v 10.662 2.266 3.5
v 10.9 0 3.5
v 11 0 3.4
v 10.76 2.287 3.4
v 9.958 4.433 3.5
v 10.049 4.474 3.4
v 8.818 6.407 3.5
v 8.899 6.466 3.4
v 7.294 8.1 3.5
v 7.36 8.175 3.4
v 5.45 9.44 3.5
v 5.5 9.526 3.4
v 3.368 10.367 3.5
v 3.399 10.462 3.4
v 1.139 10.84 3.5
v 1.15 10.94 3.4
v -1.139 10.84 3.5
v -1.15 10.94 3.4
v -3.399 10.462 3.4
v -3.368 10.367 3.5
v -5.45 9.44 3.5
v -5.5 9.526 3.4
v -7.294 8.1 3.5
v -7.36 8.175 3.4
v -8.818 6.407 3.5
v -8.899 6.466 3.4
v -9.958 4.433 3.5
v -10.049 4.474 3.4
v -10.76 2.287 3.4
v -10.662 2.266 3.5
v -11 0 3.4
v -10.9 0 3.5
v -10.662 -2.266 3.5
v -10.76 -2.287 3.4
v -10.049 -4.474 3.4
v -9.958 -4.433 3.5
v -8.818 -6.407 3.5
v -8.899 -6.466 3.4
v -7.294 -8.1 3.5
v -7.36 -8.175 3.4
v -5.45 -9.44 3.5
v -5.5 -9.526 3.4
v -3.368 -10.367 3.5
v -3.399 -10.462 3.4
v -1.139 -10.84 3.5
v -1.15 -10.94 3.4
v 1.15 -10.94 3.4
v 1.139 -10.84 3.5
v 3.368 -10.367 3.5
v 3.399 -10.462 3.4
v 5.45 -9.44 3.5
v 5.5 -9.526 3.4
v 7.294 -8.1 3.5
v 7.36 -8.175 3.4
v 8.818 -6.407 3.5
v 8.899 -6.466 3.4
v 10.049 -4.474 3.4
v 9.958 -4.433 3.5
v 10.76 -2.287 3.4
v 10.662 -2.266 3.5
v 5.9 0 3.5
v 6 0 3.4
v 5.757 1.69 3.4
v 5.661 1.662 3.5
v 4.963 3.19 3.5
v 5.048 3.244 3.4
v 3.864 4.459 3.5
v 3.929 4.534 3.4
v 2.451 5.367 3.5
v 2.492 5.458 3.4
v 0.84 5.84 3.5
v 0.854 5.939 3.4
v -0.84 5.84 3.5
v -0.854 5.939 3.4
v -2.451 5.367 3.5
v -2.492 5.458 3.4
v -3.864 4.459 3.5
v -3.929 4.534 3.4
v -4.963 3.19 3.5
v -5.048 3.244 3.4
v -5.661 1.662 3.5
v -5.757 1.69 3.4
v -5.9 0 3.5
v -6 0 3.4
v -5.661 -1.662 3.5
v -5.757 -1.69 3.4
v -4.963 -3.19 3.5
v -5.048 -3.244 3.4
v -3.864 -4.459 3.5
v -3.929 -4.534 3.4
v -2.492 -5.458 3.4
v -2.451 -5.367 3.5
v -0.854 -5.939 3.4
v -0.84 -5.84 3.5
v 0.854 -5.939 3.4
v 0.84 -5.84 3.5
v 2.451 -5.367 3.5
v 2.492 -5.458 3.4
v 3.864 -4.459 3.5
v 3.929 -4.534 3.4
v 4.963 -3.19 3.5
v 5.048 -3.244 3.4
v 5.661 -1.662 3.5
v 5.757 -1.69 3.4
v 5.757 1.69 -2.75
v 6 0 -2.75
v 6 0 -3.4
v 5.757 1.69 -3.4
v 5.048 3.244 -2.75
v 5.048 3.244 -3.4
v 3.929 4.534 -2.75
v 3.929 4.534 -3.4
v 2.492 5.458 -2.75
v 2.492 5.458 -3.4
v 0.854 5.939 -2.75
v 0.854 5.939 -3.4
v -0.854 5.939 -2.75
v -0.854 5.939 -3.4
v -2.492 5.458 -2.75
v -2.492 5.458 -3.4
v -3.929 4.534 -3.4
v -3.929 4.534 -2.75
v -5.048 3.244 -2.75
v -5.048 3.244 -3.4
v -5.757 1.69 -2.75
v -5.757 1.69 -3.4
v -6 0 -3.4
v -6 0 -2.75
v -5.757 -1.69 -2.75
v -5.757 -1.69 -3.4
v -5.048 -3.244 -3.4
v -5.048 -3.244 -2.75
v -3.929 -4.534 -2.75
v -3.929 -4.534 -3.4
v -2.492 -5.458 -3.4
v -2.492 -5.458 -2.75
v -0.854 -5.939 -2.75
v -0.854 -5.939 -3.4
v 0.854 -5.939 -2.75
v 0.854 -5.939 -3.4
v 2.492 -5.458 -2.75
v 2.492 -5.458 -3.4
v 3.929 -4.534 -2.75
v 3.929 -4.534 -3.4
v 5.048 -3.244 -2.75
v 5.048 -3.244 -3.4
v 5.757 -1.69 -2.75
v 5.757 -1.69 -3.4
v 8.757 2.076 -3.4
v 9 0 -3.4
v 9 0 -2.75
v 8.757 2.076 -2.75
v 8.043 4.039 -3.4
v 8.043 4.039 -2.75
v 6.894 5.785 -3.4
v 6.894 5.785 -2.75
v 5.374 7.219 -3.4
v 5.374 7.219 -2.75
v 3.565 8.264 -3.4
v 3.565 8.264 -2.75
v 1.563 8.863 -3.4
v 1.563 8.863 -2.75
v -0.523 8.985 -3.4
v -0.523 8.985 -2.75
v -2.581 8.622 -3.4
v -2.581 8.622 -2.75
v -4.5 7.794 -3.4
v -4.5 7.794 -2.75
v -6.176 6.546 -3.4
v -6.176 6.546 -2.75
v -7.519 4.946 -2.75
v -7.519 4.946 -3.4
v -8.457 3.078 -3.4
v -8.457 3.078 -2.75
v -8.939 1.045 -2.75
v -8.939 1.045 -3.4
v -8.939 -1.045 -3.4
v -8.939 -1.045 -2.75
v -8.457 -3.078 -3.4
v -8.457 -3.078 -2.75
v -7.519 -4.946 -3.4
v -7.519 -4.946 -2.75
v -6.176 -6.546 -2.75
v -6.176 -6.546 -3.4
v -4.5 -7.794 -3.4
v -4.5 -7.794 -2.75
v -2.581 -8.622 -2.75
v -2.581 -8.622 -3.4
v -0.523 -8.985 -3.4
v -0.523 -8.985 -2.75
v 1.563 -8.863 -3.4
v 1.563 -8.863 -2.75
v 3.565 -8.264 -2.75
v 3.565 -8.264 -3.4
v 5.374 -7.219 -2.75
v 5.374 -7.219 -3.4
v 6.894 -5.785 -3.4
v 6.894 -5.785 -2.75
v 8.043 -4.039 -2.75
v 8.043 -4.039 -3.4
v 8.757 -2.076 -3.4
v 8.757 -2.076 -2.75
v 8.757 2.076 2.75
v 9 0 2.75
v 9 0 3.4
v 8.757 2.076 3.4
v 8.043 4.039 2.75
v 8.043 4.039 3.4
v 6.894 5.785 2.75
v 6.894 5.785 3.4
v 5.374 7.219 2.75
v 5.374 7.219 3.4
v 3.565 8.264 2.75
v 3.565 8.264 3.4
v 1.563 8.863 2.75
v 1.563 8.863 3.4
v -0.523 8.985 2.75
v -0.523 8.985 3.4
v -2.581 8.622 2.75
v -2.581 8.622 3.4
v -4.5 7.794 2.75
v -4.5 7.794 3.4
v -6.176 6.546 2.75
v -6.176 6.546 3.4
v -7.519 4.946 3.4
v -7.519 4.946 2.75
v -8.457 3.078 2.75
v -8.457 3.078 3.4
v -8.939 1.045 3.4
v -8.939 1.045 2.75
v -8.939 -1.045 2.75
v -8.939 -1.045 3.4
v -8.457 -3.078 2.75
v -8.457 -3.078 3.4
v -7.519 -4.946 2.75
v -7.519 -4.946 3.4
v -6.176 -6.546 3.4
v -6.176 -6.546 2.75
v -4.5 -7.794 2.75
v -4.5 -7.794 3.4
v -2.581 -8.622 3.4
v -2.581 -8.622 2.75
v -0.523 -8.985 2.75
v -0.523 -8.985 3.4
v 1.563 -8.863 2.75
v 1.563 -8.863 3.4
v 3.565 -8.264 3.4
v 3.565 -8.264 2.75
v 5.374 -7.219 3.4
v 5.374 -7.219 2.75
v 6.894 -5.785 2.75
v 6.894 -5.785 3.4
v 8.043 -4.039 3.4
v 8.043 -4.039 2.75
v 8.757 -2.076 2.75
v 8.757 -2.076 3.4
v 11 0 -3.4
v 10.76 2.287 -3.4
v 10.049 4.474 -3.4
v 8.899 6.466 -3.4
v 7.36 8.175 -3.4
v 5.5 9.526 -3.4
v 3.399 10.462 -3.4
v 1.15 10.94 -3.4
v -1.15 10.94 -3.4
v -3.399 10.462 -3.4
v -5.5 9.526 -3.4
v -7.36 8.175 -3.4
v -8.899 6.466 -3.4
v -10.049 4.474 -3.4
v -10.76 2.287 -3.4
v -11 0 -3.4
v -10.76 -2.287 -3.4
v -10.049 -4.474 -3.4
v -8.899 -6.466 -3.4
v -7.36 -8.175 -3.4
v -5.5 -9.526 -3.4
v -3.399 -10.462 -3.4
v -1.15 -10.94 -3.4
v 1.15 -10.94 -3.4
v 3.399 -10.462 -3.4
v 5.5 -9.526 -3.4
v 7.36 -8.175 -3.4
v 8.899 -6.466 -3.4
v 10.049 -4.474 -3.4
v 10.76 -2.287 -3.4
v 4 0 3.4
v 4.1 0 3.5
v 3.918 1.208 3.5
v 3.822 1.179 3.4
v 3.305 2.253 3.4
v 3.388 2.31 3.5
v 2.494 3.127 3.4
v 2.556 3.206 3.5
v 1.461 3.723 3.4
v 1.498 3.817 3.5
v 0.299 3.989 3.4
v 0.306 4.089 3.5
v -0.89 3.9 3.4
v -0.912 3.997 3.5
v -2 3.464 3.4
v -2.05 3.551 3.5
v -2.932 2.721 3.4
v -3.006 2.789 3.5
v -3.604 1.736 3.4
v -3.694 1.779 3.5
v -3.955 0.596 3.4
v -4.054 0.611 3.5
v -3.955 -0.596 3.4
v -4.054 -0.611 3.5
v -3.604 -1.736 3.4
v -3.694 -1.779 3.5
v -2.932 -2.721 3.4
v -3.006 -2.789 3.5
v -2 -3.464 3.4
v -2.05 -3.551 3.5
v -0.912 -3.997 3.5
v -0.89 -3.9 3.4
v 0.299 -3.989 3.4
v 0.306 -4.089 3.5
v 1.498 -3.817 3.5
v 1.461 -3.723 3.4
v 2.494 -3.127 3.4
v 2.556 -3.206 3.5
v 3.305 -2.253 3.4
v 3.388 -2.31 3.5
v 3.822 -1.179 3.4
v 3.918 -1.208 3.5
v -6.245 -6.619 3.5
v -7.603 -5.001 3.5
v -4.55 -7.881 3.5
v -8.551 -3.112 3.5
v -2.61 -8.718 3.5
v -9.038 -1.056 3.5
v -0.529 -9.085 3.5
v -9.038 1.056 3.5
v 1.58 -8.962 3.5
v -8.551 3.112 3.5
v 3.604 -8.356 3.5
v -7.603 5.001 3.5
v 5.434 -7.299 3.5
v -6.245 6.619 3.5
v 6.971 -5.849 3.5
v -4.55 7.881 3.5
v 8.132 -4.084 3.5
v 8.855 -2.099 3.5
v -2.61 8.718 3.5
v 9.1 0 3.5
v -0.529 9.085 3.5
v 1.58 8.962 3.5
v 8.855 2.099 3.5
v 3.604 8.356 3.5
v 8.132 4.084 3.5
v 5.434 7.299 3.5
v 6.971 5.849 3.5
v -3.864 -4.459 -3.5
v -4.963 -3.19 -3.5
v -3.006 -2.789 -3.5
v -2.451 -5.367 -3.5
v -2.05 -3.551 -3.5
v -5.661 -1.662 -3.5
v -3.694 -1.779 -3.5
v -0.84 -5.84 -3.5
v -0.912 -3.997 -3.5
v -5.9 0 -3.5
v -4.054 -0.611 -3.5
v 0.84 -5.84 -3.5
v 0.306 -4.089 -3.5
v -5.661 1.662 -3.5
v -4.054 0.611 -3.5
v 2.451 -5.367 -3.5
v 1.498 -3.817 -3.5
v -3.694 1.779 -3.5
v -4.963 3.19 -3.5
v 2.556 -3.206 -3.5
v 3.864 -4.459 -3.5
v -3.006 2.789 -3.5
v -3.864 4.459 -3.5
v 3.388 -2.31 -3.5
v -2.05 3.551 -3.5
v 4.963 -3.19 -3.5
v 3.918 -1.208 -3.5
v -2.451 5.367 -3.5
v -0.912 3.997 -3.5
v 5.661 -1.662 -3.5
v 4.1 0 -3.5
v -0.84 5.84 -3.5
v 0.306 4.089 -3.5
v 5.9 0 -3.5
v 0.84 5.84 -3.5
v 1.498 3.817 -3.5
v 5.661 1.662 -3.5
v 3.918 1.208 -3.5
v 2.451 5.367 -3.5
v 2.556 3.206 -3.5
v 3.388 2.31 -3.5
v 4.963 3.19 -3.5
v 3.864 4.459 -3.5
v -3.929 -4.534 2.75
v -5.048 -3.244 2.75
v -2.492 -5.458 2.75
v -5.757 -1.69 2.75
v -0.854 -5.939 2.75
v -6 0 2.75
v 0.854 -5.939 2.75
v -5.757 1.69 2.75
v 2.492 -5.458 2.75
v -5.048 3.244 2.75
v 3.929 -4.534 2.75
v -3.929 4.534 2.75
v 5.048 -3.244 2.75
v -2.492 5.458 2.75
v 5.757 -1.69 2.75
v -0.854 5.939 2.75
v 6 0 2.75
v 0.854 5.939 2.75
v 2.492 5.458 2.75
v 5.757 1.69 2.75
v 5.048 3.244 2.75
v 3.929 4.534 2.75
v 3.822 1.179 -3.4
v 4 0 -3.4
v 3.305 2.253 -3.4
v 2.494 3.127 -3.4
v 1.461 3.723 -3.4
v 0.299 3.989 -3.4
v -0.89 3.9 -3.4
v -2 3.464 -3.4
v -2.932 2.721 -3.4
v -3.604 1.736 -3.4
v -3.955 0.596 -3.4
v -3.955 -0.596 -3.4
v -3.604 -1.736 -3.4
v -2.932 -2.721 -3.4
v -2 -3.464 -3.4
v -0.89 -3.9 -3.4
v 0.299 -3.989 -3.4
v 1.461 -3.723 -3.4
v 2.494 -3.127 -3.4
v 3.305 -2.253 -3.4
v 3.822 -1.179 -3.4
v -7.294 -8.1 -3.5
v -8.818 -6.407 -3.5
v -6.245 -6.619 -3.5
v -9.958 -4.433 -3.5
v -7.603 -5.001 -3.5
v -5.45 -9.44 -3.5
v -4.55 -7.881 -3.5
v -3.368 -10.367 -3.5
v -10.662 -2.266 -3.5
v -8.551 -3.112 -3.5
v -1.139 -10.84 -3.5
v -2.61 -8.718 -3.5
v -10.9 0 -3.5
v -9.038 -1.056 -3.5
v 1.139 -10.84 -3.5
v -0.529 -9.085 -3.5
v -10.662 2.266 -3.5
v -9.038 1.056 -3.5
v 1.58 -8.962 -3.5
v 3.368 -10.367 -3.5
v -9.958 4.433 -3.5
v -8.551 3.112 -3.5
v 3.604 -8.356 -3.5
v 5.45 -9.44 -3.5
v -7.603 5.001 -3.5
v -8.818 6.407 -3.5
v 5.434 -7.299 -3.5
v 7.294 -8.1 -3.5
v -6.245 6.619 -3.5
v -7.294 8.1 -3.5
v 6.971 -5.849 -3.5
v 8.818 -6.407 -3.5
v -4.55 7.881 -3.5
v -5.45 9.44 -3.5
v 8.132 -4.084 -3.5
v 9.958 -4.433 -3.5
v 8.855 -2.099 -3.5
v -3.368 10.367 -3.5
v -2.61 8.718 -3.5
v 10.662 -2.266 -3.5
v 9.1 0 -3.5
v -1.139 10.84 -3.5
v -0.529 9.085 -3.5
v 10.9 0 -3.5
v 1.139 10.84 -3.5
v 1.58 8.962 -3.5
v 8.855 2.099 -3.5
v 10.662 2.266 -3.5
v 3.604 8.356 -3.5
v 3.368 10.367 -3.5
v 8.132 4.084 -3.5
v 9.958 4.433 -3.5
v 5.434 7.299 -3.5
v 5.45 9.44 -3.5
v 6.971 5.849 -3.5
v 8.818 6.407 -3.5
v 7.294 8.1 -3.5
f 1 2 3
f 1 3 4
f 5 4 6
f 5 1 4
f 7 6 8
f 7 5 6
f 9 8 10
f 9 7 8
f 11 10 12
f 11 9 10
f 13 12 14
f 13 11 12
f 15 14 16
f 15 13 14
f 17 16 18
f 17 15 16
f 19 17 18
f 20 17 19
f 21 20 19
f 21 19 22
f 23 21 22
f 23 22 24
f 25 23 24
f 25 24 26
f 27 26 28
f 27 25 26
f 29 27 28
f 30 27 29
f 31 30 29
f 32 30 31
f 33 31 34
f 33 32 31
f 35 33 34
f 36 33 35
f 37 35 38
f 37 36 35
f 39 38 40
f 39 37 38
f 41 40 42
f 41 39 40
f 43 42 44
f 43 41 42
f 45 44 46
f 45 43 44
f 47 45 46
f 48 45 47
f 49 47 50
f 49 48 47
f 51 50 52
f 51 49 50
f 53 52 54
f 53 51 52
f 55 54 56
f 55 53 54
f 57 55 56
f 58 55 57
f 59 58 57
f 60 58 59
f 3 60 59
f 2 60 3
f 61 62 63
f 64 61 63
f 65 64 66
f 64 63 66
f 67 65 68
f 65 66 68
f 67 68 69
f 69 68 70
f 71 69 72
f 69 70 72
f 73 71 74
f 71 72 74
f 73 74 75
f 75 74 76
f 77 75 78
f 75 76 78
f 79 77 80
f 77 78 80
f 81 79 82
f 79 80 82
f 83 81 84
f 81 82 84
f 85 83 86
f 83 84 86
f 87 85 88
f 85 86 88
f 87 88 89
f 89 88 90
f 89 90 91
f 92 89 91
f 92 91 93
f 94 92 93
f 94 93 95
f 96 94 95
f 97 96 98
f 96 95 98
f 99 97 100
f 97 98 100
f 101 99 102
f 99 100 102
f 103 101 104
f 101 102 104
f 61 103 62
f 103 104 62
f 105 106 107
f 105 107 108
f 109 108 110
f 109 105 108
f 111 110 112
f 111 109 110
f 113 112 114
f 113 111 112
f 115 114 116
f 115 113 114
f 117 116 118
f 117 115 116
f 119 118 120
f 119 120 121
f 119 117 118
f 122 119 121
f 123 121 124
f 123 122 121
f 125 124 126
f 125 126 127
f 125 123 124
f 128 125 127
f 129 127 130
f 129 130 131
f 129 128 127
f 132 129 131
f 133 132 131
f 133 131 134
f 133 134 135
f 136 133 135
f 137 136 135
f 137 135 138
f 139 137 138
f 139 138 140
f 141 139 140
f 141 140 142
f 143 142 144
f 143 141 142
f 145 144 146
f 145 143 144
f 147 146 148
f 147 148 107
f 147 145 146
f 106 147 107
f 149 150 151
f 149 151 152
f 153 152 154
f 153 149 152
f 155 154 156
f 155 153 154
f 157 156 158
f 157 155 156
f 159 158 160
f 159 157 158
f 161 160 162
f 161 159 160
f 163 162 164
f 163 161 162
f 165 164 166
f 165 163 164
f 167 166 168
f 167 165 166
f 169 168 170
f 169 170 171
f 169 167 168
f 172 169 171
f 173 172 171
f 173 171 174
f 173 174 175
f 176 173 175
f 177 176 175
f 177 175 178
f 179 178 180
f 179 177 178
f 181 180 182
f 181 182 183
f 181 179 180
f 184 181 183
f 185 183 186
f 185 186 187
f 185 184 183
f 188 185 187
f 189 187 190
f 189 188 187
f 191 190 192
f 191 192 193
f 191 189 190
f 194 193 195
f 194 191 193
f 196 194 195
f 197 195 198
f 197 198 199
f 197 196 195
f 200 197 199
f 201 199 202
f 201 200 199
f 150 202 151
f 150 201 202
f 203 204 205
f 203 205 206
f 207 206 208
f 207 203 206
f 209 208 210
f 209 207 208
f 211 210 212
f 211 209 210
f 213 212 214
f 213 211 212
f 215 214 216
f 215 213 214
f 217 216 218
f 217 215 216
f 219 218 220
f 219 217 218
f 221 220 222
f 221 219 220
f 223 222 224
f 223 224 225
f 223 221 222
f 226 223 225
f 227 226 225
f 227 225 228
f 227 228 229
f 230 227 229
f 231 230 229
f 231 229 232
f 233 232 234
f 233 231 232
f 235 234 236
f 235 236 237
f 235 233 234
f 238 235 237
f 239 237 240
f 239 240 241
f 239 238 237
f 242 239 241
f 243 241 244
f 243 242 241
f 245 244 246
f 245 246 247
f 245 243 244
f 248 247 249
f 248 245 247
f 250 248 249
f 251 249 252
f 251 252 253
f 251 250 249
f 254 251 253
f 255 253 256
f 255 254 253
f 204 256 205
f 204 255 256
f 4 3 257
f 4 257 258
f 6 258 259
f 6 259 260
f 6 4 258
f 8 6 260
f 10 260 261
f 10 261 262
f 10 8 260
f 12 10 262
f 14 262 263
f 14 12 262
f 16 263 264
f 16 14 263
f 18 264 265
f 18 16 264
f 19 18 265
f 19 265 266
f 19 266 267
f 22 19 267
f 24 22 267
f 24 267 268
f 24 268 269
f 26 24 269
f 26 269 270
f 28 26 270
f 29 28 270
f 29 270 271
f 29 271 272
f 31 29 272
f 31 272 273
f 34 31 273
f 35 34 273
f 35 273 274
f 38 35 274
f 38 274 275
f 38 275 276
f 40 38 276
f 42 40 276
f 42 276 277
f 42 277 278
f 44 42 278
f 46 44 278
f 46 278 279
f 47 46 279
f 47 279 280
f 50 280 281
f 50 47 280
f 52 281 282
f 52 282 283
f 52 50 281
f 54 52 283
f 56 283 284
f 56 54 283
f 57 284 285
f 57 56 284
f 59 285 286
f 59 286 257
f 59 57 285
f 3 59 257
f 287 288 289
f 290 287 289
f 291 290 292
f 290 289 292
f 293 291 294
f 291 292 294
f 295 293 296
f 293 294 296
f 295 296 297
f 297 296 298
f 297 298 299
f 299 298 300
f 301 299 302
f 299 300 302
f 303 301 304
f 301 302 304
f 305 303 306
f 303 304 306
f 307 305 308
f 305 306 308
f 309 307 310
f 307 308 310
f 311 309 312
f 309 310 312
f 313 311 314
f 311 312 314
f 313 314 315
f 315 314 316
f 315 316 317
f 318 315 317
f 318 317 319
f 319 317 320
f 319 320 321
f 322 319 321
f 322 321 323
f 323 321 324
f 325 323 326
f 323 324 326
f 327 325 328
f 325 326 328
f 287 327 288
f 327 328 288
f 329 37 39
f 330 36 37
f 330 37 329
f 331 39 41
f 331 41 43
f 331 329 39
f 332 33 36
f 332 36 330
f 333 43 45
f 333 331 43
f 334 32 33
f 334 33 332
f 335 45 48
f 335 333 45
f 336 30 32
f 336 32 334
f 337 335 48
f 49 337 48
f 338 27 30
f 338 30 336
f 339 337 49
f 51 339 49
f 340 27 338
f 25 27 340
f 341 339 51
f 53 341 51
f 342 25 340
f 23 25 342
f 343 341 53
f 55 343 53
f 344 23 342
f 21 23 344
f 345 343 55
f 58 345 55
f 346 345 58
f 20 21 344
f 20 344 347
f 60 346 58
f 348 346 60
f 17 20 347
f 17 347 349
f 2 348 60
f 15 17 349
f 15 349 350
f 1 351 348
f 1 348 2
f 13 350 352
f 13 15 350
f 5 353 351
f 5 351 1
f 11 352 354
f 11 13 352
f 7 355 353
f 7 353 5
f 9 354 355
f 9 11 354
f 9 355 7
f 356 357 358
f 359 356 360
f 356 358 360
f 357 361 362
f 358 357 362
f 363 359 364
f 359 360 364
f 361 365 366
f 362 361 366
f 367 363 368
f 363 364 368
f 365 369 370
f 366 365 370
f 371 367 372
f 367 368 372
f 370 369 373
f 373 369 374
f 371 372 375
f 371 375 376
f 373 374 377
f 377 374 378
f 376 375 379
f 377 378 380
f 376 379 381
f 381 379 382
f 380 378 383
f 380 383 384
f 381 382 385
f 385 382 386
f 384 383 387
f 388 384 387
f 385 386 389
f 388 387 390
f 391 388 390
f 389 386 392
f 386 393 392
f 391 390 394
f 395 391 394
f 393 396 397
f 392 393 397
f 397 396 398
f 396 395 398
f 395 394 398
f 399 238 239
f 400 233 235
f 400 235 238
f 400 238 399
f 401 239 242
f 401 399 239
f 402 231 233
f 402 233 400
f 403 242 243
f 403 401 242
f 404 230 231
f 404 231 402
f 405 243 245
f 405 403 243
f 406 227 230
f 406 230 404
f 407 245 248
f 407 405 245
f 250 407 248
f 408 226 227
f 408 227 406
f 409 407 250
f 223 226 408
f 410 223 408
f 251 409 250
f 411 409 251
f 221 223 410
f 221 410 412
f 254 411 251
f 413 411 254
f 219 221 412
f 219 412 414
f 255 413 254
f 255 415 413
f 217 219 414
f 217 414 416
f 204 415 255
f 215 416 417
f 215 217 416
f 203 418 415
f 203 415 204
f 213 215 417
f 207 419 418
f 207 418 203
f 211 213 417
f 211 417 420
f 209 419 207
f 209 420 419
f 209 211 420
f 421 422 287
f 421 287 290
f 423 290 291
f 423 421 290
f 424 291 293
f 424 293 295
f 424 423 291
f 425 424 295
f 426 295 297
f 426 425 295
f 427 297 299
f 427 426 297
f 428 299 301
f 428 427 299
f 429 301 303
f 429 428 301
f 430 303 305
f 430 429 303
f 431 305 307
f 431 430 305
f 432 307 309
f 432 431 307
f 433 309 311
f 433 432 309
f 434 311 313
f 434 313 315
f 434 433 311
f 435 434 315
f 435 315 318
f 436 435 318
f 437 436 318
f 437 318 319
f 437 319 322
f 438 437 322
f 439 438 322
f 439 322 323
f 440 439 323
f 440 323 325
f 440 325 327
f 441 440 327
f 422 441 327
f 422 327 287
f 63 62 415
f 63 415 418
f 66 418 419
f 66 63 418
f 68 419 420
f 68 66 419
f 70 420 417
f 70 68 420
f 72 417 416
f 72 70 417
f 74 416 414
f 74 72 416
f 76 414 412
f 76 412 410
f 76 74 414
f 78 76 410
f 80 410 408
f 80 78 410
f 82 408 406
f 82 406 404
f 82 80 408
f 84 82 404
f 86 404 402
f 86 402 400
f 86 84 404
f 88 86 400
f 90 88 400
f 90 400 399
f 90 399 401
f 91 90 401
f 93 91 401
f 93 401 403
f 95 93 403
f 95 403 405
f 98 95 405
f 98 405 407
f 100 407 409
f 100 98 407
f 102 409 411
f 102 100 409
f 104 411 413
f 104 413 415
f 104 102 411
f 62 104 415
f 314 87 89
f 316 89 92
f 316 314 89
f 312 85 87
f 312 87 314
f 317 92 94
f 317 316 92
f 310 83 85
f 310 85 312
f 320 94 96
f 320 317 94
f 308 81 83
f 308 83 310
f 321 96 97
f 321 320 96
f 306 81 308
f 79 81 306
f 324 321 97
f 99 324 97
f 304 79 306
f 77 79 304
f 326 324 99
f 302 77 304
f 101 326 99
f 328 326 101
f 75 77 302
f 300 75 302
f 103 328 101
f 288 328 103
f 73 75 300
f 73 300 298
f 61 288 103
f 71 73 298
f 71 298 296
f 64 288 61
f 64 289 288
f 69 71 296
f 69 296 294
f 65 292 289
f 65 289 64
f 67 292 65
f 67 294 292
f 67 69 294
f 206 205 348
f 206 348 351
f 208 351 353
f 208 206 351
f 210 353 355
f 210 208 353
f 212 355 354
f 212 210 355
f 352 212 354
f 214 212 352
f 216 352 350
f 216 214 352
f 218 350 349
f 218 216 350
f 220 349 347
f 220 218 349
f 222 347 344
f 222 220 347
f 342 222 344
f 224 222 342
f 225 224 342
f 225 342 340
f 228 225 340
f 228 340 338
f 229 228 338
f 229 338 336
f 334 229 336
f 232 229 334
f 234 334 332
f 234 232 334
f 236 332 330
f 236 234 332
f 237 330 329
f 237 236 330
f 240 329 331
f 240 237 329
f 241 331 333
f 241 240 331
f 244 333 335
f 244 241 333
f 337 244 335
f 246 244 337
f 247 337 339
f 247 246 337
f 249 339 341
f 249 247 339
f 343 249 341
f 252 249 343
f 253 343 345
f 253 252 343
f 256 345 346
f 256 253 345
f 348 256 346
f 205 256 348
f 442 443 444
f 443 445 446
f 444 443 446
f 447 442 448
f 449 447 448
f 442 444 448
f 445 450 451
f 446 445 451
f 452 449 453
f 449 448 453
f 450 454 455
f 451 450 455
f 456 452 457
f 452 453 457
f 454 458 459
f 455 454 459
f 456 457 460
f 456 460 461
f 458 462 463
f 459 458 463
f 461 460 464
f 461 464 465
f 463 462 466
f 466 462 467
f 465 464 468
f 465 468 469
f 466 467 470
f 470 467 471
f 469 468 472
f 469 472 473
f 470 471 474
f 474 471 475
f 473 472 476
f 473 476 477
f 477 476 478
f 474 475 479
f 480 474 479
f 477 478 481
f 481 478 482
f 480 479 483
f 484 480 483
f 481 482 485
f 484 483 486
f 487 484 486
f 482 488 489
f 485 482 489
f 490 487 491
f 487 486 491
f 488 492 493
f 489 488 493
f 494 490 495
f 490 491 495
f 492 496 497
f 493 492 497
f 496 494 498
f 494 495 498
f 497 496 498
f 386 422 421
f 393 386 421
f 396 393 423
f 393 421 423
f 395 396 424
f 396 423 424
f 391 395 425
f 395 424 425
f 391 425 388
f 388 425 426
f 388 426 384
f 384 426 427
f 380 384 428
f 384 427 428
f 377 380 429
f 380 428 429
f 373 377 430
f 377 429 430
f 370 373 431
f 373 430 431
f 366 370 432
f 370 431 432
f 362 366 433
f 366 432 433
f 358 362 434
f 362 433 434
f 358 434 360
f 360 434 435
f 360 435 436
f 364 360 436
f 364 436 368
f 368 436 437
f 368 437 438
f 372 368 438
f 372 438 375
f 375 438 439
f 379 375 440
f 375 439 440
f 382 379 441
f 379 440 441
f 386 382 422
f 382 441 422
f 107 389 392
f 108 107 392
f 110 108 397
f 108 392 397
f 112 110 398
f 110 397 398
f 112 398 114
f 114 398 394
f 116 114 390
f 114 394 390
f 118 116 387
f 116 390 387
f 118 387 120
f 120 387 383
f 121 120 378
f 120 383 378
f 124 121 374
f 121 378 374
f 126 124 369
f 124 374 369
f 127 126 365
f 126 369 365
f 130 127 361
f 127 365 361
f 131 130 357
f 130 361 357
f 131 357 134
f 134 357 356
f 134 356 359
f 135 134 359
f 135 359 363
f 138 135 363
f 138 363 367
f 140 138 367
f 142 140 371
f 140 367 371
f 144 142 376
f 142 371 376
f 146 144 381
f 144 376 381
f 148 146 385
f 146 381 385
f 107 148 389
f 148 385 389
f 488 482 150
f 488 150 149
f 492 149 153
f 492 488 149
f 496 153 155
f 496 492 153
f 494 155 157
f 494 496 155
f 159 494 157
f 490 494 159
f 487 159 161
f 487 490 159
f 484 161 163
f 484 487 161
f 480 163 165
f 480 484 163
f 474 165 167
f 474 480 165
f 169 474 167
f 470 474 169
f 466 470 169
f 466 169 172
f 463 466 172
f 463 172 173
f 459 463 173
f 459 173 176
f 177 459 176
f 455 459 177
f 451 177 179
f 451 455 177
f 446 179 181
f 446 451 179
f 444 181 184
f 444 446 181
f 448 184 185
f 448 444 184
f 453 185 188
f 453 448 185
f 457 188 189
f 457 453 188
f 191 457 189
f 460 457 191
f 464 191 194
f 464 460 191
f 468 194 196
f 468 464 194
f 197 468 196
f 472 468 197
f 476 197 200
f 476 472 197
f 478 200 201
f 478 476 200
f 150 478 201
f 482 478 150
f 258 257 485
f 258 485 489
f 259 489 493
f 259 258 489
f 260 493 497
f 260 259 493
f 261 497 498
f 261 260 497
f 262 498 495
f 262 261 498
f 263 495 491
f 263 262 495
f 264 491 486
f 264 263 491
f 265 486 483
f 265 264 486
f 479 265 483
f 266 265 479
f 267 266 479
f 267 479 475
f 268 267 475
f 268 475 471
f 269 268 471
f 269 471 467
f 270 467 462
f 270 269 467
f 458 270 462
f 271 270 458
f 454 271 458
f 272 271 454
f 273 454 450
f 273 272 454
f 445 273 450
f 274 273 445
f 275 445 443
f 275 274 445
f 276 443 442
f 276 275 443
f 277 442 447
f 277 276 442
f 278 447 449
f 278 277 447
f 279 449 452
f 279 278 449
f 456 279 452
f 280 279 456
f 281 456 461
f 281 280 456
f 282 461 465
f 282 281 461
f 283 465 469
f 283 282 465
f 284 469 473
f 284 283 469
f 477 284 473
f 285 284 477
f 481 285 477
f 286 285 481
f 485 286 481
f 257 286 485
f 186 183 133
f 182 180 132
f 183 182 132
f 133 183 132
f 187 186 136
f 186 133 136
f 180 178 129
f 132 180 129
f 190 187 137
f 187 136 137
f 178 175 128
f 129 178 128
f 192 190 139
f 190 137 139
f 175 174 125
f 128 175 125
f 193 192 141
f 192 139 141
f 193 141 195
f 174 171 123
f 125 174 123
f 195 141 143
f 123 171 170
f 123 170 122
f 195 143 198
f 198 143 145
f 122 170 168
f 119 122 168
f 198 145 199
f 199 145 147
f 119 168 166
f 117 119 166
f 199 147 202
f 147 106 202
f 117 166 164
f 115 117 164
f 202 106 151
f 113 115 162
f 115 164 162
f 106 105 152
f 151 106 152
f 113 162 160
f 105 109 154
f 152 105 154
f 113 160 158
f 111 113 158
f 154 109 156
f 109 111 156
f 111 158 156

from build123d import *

# Parameters (mm, degrees)
F0_R     = 11
F0_R_2   = 9
F1_DEPTH = 3.5
F0_R_3   = 6
F0_R_4   = 4
F2_DEPTH = 2.75
F3_SIZE  = 0.1


with BuildPart() as f1:
    # F0 (on Top) → F1 (new body, symmetric)
    with BuildSketch(Plane.XY):
        Circle(F0_R)
        Circle(F0_R_2, mode=Mode.SUBTRACT)
    extrude(amount=F1_DEPTH, both=True)



with BuildPart() as f1b:
    # F0 (on Top) → F1, piece 2 (new body, symmetric)
    with BuildSketch(Plane.XY):
        Circle(F0_R_3)
        Circle(F0_R_4, mode=Mode.SUBTRACT)
    extrude(amount=F1_DEPTH, both=True)


with BuildPart() as f1_1:
    add(f1.part)

    add(f1b.part)  # F2 merges F1b
    # F0 (on Top) → F2 (join, symmetric)
    with BuildSketch(Plane.XY):
        Circle(F0_R_2)
        Circle(F0_R_3, mode=Mode.SUBTRACT)
    extrude(amount=F2_DEPTH, both=True)

    # F3
    f3_edges = [f1_1.edges().sort_by_distance(p)[0] for p in [
        (-4, 0, 3.5),
        (-4, 0, -3.5),
        (-11, 0, 3.5),
        (-9, 0, 3.5),
        (-6, 0, 3.5),
        (-11, 0, -3.5),
        (-9, 0, -3.5),
        (-6, 0, -3.5),
    ]]
    chamfer(f3_edges, length=F3_SIZE)


solid = f1_1.part
